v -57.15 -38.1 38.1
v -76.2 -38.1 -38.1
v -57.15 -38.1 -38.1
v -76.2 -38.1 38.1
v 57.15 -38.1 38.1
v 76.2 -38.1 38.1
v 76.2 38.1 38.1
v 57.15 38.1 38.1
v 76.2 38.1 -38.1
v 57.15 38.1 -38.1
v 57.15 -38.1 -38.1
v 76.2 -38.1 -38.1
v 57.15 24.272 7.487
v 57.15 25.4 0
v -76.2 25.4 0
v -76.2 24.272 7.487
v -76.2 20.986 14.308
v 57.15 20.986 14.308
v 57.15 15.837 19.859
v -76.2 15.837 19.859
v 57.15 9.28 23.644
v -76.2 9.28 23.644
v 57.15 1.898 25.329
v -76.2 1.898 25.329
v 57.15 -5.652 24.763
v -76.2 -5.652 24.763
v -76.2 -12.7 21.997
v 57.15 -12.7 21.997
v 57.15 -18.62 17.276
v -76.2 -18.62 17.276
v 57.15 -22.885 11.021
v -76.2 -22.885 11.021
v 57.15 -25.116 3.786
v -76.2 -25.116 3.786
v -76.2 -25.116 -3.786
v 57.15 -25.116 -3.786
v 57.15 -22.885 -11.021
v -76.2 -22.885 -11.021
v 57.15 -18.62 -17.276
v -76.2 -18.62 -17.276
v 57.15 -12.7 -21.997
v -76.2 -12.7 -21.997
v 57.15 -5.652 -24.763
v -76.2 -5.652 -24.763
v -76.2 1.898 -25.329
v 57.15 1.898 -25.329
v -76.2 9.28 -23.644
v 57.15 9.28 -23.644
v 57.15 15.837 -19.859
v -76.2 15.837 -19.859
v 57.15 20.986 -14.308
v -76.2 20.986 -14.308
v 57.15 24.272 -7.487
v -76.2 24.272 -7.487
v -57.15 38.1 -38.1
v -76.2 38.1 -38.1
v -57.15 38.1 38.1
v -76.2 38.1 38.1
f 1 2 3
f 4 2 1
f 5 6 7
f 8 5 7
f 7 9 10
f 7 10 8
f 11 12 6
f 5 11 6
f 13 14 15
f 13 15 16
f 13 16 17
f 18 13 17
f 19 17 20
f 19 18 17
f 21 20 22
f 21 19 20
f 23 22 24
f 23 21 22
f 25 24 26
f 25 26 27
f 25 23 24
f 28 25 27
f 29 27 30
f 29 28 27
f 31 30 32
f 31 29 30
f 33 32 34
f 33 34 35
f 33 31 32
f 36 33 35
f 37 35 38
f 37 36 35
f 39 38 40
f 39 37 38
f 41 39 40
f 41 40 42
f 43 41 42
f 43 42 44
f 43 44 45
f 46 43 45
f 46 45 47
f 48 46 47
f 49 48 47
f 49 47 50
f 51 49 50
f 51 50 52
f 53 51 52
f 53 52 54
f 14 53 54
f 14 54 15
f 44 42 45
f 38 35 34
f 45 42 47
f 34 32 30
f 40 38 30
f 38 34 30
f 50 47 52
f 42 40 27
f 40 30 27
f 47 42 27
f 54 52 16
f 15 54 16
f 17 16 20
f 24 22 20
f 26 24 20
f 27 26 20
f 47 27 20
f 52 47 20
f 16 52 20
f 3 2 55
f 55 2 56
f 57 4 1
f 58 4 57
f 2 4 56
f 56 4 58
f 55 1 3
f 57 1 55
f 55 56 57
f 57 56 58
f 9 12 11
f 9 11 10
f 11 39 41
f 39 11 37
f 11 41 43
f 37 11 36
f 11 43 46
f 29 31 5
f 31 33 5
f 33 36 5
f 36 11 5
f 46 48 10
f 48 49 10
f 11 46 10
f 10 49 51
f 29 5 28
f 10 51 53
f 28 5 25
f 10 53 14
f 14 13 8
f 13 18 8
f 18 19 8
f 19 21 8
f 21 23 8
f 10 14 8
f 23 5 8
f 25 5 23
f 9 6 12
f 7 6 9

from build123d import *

# Parameters (mm, degrees)
F0_W     = 76.2
F0_H     = 76.2
F1_DEPTH = 19.05
F4_R     = 25.4
F5_DEPTH = 152.4


# Not quite as in the source:
# - a feature names something its author has since deleted; it is built from what else it names


with BuildPart() as f1:
    # F0 (on Right) → F1 (new body)
    with BuildSketch(Plane.YZ):
        Rectangle(F0_W, F0_H)
    extrude(amount=F1_DEPTH)


with BuildPart() as f1_1:
    # F2: moved
    add(f1.part.moved(Location((-76.2, 0, 0))))


with BuildPart() as f3_1:
    # F3: instance of F1
    add(f1_1.part.mirror(Plane.YZ))

    # F4 (on face) → F5 (join)
    with BuildSketch(Plane.YZ.offset(76.2)):
        Circle(F4_R)
    extrude(amount=-F5_DEPTH)


solid = Compound([f1_1.part, f3_1.part])
